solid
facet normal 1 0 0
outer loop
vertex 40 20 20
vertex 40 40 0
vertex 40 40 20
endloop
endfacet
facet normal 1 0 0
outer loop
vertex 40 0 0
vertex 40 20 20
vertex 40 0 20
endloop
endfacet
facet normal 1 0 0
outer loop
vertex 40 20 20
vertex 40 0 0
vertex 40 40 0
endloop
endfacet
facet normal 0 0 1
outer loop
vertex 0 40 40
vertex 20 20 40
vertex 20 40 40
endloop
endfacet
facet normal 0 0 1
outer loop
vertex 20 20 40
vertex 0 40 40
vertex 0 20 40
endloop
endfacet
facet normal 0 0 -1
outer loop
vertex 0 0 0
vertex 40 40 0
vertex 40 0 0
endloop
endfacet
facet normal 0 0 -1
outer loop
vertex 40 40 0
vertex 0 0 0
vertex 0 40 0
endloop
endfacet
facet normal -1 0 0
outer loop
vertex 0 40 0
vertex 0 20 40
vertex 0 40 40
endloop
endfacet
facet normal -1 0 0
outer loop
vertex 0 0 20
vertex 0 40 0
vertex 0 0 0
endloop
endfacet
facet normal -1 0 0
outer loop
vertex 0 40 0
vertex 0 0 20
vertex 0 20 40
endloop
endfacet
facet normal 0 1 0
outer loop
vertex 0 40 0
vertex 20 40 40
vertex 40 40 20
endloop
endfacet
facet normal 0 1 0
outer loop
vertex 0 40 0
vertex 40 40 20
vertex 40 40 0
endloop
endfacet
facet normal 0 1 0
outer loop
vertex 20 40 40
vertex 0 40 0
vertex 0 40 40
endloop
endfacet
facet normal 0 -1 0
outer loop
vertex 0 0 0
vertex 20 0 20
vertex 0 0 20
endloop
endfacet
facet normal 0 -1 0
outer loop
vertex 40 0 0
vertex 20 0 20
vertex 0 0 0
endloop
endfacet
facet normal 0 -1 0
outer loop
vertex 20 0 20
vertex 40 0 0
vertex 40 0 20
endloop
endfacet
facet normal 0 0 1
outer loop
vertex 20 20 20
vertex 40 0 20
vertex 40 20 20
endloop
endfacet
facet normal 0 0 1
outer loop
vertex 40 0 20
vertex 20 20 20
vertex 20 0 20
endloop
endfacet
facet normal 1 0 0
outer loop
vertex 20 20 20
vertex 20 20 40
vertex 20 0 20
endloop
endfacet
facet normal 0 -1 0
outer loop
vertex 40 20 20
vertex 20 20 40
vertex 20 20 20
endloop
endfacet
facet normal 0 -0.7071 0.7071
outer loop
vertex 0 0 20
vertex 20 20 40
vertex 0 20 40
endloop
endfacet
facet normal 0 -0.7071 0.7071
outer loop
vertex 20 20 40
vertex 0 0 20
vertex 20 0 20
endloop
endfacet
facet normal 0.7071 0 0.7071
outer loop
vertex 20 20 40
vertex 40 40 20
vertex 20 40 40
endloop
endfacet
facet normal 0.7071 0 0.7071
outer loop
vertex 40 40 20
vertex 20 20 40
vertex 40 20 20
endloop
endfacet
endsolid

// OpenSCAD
difference(){
  cube([40, 40, 40], center=false);
  translate([20, 0, 20]){
    cube([20, 20, 20], center=false);
  }
  translate([0, 0, 20]){
    color([1,0.8,0]) {
      rotate([45, 0, 0]){
        cube([20, 30, 20], center=false);
      }
    }
  }
  color([1,0.8,0]) {
    translate([20, 20, 40]){
      rotate([0, 45, 0]){
        cube([30, 20, 20], center=false);
      }
    }
  }
}
